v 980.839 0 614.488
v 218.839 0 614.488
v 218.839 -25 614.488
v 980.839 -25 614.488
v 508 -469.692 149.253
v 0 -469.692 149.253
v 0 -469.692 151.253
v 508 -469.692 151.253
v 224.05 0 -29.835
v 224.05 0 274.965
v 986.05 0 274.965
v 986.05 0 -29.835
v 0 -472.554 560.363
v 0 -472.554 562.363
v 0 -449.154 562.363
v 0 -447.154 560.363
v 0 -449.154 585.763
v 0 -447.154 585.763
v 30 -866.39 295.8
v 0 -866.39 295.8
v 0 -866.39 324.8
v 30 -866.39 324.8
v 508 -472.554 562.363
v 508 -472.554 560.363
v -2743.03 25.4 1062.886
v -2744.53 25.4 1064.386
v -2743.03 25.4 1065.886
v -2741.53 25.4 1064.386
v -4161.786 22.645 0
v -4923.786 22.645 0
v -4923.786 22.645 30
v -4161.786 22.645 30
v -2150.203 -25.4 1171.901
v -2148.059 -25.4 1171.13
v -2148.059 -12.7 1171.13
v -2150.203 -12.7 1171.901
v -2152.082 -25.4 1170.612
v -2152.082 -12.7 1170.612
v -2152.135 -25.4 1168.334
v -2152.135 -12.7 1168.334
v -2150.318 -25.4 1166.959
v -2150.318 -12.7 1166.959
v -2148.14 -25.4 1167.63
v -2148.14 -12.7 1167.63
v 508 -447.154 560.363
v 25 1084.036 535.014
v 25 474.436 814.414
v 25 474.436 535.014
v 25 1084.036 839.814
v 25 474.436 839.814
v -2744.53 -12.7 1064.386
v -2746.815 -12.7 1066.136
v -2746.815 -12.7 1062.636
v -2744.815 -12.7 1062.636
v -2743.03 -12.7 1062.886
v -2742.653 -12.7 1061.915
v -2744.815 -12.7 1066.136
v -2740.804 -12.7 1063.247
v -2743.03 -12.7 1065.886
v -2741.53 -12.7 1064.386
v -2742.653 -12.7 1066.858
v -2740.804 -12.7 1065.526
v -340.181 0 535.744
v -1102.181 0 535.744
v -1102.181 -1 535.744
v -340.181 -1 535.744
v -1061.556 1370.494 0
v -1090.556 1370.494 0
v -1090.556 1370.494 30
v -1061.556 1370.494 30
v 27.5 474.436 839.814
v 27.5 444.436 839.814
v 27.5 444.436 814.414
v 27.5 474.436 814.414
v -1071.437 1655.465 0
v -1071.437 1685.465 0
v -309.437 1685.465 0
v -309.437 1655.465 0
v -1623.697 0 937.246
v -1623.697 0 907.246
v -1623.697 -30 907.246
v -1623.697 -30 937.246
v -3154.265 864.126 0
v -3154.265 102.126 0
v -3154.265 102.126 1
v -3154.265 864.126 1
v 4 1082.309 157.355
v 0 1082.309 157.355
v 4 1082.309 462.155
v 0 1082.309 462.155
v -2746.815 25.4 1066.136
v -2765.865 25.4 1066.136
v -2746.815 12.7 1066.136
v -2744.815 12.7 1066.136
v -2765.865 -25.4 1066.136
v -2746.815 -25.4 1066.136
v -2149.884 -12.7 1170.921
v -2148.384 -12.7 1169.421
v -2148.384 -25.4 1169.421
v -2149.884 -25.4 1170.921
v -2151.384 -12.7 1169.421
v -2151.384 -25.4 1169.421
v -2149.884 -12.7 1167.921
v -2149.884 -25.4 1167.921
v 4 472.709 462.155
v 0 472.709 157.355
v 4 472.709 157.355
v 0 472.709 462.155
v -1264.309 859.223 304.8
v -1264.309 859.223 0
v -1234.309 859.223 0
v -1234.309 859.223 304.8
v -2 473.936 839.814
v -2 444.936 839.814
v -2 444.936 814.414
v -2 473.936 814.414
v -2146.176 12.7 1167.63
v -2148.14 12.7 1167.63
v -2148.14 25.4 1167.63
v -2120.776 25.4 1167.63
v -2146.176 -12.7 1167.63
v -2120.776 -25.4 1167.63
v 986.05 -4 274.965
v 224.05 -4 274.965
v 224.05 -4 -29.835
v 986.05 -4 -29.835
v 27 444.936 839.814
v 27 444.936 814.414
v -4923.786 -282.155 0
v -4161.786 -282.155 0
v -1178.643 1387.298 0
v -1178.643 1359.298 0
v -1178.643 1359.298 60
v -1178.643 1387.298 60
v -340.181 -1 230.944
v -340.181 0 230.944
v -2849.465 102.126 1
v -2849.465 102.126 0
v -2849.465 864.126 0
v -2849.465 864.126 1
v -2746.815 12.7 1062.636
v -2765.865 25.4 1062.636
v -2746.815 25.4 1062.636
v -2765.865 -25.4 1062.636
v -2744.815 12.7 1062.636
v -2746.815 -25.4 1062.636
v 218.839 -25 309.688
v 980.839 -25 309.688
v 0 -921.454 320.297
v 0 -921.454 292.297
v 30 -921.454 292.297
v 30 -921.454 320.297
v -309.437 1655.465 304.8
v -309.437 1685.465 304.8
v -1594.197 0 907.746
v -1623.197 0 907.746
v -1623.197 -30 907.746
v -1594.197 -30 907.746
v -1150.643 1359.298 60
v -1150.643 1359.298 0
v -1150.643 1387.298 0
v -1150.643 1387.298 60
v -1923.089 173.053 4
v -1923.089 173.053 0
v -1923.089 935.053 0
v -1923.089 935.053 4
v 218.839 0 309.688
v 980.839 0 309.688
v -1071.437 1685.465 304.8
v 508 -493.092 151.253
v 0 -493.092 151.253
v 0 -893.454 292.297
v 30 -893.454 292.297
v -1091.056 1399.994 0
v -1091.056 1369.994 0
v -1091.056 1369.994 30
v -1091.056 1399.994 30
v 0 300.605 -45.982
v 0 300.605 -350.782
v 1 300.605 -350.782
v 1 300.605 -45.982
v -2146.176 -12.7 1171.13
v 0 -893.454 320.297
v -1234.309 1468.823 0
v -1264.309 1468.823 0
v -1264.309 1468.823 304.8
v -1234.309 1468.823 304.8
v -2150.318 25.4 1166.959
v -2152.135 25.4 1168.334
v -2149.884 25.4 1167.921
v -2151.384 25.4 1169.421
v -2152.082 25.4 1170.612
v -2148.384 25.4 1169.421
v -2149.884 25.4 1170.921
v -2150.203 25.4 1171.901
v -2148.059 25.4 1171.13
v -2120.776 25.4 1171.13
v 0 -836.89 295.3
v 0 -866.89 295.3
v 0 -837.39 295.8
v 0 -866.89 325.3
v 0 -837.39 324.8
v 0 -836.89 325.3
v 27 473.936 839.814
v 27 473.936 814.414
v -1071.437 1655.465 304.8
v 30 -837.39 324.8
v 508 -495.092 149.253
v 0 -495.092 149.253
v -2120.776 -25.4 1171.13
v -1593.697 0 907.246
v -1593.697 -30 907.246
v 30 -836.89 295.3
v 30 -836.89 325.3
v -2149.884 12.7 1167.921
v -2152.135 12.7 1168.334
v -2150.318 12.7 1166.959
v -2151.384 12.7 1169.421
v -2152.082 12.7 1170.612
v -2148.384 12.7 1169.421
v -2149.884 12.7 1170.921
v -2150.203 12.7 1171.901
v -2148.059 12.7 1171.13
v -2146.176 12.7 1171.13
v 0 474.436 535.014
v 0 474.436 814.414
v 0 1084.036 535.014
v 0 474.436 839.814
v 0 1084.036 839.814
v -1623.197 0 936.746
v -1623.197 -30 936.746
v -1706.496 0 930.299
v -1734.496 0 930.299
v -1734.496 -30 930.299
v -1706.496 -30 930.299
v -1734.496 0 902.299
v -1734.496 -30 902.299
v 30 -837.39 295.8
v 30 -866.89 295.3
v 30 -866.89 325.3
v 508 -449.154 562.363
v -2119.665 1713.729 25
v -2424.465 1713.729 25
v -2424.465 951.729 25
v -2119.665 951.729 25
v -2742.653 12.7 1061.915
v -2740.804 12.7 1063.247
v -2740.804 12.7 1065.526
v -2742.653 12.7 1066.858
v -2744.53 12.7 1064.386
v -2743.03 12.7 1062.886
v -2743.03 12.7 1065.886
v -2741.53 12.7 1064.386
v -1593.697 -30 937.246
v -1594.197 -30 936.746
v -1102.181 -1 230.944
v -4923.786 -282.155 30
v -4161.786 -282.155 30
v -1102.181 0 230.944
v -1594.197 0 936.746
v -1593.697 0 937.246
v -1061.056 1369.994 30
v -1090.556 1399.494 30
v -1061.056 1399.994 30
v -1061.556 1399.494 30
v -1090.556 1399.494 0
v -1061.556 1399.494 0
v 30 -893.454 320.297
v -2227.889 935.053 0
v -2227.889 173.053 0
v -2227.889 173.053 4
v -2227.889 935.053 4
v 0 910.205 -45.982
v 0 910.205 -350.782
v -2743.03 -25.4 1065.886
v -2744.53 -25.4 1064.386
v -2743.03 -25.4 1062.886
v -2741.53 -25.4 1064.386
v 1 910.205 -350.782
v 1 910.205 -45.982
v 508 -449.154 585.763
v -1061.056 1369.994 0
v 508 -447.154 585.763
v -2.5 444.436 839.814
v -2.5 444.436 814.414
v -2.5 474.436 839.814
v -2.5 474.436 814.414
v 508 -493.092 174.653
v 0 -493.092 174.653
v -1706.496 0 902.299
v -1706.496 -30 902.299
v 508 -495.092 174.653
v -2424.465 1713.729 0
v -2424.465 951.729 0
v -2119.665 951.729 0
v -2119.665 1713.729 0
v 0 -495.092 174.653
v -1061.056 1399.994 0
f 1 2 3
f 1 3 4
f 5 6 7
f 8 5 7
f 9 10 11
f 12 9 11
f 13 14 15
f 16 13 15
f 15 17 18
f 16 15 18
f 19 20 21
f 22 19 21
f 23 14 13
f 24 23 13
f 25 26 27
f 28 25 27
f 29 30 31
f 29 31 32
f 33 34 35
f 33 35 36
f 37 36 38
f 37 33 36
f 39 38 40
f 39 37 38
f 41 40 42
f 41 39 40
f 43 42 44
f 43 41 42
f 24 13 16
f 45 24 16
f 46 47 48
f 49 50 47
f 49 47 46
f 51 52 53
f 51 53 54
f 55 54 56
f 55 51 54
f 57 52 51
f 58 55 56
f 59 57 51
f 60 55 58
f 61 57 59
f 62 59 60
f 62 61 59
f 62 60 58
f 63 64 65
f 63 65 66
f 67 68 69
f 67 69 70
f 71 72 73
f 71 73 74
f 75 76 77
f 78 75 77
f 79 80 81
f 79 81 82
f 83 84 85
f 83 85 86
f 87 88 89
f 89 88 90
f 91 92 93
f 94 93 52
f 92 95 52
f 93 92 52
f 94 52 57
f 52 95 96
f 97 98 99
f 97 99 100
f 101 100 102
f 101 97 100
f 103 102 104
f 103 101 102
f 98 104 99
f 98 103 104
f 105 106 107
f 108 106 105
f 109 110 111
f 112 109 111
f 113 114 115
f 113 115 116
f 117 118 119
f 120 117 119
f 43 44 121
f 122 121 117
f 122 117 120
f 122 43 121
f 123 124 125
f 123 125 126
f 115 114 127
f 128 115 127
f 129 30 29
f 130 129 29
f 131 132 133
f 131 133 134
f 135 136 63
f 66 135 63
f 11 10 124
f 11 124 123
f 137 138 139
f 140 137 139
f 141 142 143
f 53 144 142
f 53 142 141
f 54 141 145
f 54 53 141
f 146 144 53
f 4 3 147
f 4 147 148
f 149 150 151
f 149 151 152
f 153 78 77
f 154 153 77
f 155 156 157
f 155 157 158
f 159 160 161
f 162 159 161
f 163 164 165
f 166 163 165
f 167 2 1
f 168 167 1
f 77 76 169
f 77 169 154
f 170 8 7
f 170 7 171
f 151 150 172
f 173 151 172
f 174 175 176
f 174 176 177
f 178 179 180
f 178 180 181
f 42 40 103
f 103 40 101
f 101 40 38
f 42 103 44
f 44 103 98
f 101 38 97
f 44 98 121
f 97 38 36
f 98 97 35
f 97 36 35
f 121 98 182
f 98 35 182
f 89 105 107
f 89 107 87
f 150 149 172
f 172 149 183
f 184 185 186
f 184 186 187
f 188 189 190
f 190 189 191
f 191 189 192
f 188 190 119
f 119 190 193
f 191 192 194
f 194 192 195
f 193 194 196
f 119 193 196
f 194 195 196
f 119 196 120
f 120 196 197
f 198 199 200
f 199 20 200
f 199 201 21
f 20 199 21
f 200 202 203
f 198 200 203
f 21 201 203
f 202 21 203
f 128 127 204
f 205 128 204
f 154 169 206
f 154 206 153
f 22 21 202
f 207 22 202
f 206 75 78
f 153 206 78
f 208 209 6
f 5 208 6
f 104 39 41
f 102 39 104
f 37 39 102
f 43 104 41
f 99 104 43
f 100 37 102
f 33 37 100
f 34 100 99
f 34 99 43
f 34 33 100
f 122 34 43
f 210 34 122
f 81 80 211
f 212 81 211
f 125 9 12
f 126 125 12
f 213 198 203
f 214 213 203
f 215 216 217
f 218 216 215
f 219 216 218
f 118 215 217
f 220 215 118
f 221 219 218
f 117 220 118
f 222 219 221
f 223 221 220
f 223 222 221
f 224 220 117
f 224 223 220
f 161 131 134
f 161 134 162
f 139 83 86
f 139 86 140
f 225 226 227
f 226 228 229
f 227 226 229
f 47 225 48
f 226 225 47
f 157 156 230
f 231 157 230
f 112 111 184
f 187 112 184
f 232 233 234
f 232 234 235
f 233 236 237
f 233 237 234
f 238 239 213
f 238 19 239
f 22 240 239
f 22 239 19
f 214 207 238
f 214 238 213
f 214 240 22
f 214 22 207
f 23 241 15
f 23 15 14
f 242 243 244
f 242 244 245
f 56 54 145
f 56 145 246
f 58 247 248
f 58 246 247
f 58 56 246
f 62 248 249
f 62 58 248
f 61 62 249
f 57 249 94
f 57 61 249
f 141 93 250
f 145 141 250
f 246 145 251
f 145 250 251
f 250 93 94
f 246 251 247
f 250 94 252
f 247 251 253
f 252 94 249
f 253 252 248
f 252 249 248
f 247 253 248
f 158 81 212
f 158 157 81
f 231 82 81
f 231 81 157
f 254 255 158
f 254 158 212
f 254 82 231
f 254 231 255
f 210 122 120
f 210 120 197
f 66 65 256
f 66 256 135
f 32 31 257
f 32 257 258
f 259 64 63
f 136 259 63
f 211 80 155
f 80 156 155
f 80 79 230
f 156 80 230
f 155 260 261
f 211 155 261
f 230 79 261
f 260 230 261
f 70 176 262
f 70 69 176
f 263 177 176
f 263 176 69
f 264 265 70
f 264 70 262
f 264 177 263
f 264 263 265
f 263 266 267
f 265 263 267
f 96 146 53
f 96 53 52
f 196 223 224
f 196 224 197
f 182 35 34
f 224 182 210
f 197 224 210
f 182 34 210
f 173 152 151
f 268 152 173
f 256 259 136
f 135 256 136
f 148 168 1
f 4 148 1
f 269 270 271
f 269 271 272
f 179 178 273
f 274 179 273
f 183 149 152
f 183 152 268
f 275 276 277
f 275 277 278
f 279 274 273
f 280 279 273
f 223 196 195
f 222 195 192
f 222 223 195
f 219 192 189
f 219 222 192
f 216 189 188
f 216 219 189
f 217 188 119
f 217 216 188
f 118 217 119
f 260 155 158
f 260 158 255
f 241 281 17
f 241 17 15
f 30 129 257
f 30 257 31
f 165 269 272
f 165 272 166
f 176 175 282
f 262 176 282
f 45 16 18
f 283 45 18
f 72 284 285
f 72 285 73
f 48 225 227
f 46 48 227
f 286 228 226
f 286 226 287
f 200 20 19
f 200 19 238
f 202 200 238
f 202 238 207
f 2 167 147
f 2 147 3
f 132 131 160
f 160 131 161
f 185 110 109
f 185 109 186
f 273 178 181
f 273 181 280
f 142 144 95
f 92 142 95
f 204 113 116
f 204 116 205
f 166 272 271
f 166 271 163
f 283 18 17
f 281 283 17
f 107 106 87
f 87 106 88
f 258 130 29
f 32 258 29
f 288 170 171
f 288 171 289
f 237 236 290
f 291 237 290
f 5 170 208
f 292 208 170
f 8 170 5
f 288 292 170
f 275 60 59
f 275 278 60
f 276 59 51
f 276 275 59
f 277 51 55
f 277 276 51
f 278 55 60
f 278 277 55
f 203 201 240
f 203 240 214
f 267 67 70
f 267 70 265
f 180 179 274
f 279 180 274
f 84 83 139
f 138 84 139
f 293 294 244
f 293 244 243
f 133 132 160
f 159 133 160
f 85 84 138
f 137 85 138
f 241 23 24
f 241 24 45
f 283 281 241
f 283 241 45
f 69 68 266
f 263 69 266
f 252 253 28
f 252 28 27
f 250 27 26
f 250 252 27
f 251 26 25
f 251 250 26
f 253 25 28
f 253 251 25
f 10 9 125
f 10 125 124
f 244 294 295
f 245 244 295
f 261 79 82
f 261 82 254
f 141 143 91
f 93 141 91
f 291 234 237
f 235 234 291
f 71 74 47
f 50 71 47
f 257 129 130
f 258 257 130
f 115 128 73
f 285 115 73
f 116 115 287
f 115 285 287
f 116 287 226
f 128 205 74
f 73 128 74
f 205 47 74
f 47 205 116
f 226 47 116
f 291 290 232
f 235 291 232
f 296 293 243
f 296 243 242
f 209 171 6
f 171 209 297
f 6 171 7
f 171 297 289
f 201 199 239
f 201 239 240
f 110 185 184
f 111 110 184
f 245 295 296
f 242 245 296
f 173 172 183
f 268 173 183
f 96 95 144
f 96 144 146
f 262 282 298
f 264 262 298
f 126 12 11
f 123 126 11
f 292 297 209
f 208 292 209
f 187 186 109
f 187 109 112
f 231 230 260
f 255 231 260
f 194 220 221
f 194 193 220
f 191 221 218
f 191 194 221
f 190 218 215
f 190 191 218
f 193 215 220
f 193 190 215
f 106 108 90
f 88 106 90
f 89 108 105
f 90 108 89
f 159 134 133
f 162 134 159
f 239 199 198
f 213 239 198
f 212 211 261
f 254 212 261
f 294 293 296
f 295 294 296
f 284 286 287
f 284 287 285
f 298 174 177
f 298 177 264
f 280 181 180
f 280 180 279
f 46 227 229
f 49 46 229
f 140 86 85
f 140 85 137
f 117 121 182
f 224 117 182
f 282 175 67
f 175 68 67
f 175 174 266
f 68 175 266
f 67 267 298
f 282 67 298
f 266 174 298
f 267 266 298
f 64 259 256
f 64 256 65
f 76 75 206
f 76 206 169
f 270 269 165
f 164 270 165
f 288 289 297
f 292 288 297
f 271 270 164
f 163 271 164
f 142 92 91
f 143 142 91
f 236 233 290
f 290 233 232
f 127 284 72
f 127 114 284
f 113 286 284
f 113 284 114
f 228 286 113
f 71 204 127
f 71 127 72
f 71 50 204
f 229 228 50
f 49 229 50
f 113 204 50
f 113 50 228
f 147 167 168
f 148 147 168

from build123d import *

# Parameters (mm, degrees)
F0_W      = 762
F0_H      = 304.8
F1_DEPTH  = 25
F2_W      = 762
F2_H      = 304.8
F3_DEPTH  = 4
F4_W      = 762
F4_H      = 304.8
F5_DEPTH  = 1
F6_W      = 609.6
F6_H      = 304.8
F7_DEPTH  = 25
F8_W      = 609.6
F8_H      = 304.8
F9_DEPTH  = 4
F10_W     = 609.6
F10_H     = 304.8
F11_DEPTH = 1
F13_DEPTH = 508
F15_DEPTH = 508
F16_W     = 304.8
F16_H     = 762
F17_DEPTH = 25
F18_W     = 304.8
F18_H     = 762
F19_DEPTH = 1
F20_W     = 304.8
F20_H     = 762
F21_DEPTH = 4
F22_R     = 2.5
F22_R_2   = 1.5
F23_DEPTH = 12.7
F24_DEPTH = 25.4
F26_DEPTH = 25.4
F27_W     = 19.05
F27_H     = 3.5
F28_DEPTH = 25.4
F29_R     = 2.5
F29_R_2   = 1.5
F30_DEPTH = 25.4
F31_DEPTH = 12.7
F32_W     = 2
F32_H     = 3.5
F33_DEPTH = 25.4
F34_DEPTH = 12.7
F35_W     = 25.4
F35_H     = 3.5
F36_DEPTH = 50.8
F37_W     = 29
F37_H     = 29
F38_DEPTH = 25.4
F39_W     = 28
F39_H     = 28
F40_DEPTH = 60
F41_W     = 30
F41_H     = 30
F41_W_2   = 29
F41_H_2   = 29
F42_DEPTH = 30
F43_W     = 30
F43_H     = 609.6
F44_DEPTH = 304.8
F45_W     = 762
F45_H     = 30
F46_DEPTH = 304.8
F47_W     = 28
F47_H     = 28
F48_DEPTH = 30
F49_W     = 30
F49_H     = 30
F49_W_2   = 29
F49_H_2   = 29
F50_DEPTH = 30
F51_W     = 28
F51_H     = 28
F52_DEPTH = 30
F53_W     = 30
F53_H     = 30
F53_W_2   = 29
F53_H_2   = 29
F54_DEPTH = 30
F55_W     = 762
F55_H     = 304.8
F56_DEPTH = 30


with BuildPart() as f1:
    # F0 (on Front) → F1 (new body)
    with BuildSketch(Plane.XZ):
        with Locations((599.8386698723, 462.0880805476)):
            Rectangle(F0_W, F0_H)
    extrude(amount=F1_DEPTH)


with BuildPart() as f3:
    # F2 (on Front) → F3 (new body)
    with BuildSketch(Plane.XZ):
        with Locations((605.0495383174, 122.5652631044)):
            Rectangle(F2_W, F2_H)
    extrude(amount=F3_DEPTH)


with BuildPart() as f5:
    # F4 (on Front) → F5 (new body)
    with BuildSketch(Plane.XZ):
        with Locations((-721.1805027962, 383.3438879953)):
            Rectangle(F4_W, F4_H)
    extrude(amount=F5_DEPTH)


with BuildPart() as f7:
    # F6 (on Right) → F7 (new body)
    with BuildSketch(Plane.YZ):
        with Locations((779.2355034828, 687.4139923522)):
            Rectangle(F6_W, F6_H)
    extrude(amount=F7_DEPTH)

    # F37 (on face) → F38 (join)
    with BuildSketch(Plane.XY.offset(839.8139923522)):
        Polygon((-2.5, 444.4355034828), (27.5, 444.4355034828), (27.5, 474.4355034828), (25, 474.4355034828), (0, 474.4355034828), (-2.5, 474.4355034828), align=None)
        with Locations((12.5, 459.4355034828)):
            Rectangle(F37_W, F37_H, mode=Mode.SUBTRACT)
    extrude(amount=-F38_DEPTH)


with BuildPart() as f9:
    # F8 (on Right) → F9 (new body)
    with BuildSketch(Plane.YZ):
        with Locations((777.5092337608, 309.7554932385)):
            Rectangle(F8_W, F8_H)
    extrude(amount=F9_DEPTH)


with BuildPart() as f11:
    # F10 (on Right) → F11 (new body)
    with BuildSketch(Plane.YZ):
        with Locations((605.4046195984, -198.3824845113)):
            Rectangle(F10_W, F10_H)
    extrude(amount=F11_DEPTH)


with BuildPart() as f13:
    # F12 (on Right) → F13 (new body)
    with BuildSketch(Plane.YZ):
        Polygon((-493.0915064335, 174.6528752655), (-495.0915064335, 174.6528752655), (-495.0915064335, 149.2528752655), (-469.6915064335, 149.2528752655), (-469.6915064335, 151.2528752655), (-493.0915064335, 151.2528752655), align=None)
    extrude(amount=F13_DEPTH)


with BuildPart() as f15:
    # F14 (on Right) → F15 (new body)
    with BuildSketch(Plane.YZ):
        Polygon((-447.1541363748, 560.3632873245), (-447.1541363748, 585.7632873245), (-449.1541363748, 585.7632873245), (-449.1541363748, 562.3632873245), (-472.5541363748, 562.3632873245), (-472.5541363748, 560.3632873245), align=None)
    extrude(amount=F15_DEPTH)


with BuildPart() as f17:
    # F16 (on Top) → F17 (new body)
    with BuildSketch(Plane.XY):
        with Locations((-2272.0654850662, 1332.7294546127)):
            Rectangle(F16_W, F16_H)
    extrude(amount=F17_DEPTH)


with BuildPart() as f19:
    # F18 (on Top) → F19 (new body)
    with BuildSketch(Plane.XY):
        with Locations((-3001.8648662765, 483.1261294842)):
            Rectangle(F18_W, F18_H)
    extrude(amount=F19_DEPTH)


with BuildPart() as f21:
    # F20 (on Top) → F21 (new body)
    with BuildSketch(Plane.XY):
        with Locations((-2075.48878479, 554.0529595732)):
            Rectangle(F20_W, F20_H)
    extrude(amount=F21_DEPTH)


with BuildPart() as f23:
    # F22 (on Front) → F23 (new body, symmetric)
    with BuildSketch(Plane.XZ):
        with Locations((-2743.0295944214, 1064.3863677979)):
            Circle(F22_R)
        with Locations((-2743.0295944214, 1064.3863677979)):
            Circle(F22_R_2, mode=Mode.SUBTRACT)
    extrude(amount=F23_DEPTH, both=True)

    # F22 (on Front) → F24 (join, symmetric)
    with BuildSketch(Plane.XZ):
        with Locations((-2743.0295944214, 1064.3863677979)):
            Circle(F22_R_2)
    extrude(amount=F24_DEPTH, both=True)

    # F25 (on face) → F26 (join)
    with BuildSketch(Plane(origin=(0, 12.7, 0), x_dir=(-1, 0, 0), z_dir=(0, 1, 0))):
        with BuildLine():
            Line((2746.8149515285, 1066.1363677979), (2744.8149515285, 1066.1363677979))
            ThreePointArc((2744.8149515285, 1066.1363677979), (2745.3440482196, 1065.3315152023), (2745.5295944214, 1064.3863677979))
            ThreePointArc((2745.5295944214, 1064.3863677979), (2745.3440482196, 1063.4412203934), (2744.8149515285, 1062.6363677979))
            Line((2744.8149515285, 1062.6363677979), (2746.8149515285, 1062.6363677979))
            Line((2746.8149515285, 1062.6363677979), (2746.8149515285, 1066.1363677979))
        make_face()
    extrude(amount=-F26_DEPTH)

    # F27 (on face) → F28 (join, symmetric)
    with BuildSketch(Plane.XZ):
        with Locations((-2756.3399515285, 1064.3863677979)):
            Rectangle(F27_W, F27_H)
    extrude(amount=F28_DEPTH, both=True)


with BuildPart() as f30:
    # F29 (on Front) → F30 (new body, symmetric)
    with BuildSketch(Plane.XZ):
        with Locations((-2149.8839855194, 1169.4210767746)):
            Circle(F29_R)
        with Locations((-2149.8839855194, 1169.4210767746)):
            Circle(F29_R_2, mode=Mode.SUBTRACT)
    extrude(amount=F30_DEPTH, both=True)

    # F29 (on Front) → F31 (cut, symmetric)
    with BuildSketch(Plane.XZ):
        with Locations((-2149.8839855194, 1169.4210767746)):
            Circle(F29_R)
        with Locations((-2149.8839855194, 1169.4210767746)):
            Circle(F29_R_2, mode=Mode.SUBTRACT)
    extrude(amount=F31_DEPTH, both=True, mode=Mode.SUBTRACT)

    # F32 (on face) → F33 (join, symmetric)
    with BuildSketch(Plane.XZ):
        with Locations((-2147.1759129318, 1169.3797089655)):
            Rectangle(F32_W, F32_H)
    extrude(amount=F33_DEPTH, both=True)

    # F32 (on face) → F34 (cut, symmetric)
    with BuildSketch(Plane.XZ):
        with Locations((-2147.1759129318, 1169.3797089655)):
            Rectangle(F32_W, F32_H)
    extrude(amount=F34_DEPTH, both=True, mode=Mode.SUBTRACT)

    # F35 (on face) → F36 (join)
    with BuildSketch(Plane.XZ.offset(25.4)):
        with Locations((-2133.4759129318, 1169.3797089655)):
            Rectangle(F35_W, F35_H)
    extrude(amount=-F36_DEPTH)


with BuildPart() as f40:
    # F39 (on Top) → F40 (new body)
    with BuildSketch(Plane.XY):
        with Locations((-1164.6428689957, 1373.2977523804)):
            Rectangle(F39_W, F39_H)
    extrude(amount=F40_DEPTH)


with BuildPart() as f42:
    # F41 (on Top) → F42 (new body)
    with BuildSketch(Plane.XY):
        with Locations((-1076.0562123923, 1384.9940519333)):
            Rectangle(F41_W, F41_H)
        with Locations((-1076.0562123923, 1384.9940519333)):
            Rectangle(F41_W_2, F41_H_2, mode=Mode.SUBTRACT)
    extrude(amount=F42_DEPTH)


with BuildPart() as f44:
    # F43 (on Top) → F44 (new body)
    with BuildSketch(Plane.XY):
        with Locations((-1249.3088068203, 1164.0228033066)):
            Rectangle(F43_W, F43_H)
    extrude(amount=F44_DEPTH)


with BuildPart() as f46:
    # F45 (on Top) → F46 (new body)
    with BuildSketch(Plane.XY):
        with Locations((-690.4368151316, 1670.4653501511)):
            Rectangle(F45_W, F45_H)
    extrude(amount=F46_DEPTH)


with BuildPart() as f48:
    # F47 (on Front) → F48 (new body)
    with BuildSketch(Plane.XZ):
        with Locations((-1720.4962798794, 916.2989854813)):
            Rectangle(F47_W, F47_H)
    extrude(amount=F48_DEPTH)


with BuildPart() as f50:
    # F49 (on Front) → F50 (new body)
    with BuildSketch(Plane.XZ):
        with Locations((-1608.6968025134, 922.2461204529)):
            Rectangle(F49_W, F49_H)
        with Locations((-1608.6968025134, 922.2461204529)):
            Rectangle(F49_W_2, F49_H_2, mode=Mode.SUBTRACT)
    extrude(amount=F50_DEPTH)


with BuildPart() as f52:
    # F51 (on Right) → F52 (new body)
    with BuildSketch(Plane.YZ):
        with Locations((-907.4537928112, 306.2972426414)):
            Rectangle(F51_W, F51_H)
    extrude(amount=F52_DEPTH)


with BuildPart() as f54:
    # F53 (on Right) → F54 (new body)
    with BuildSketch(Plane.YZ):
        with Locations((-851.890368133, 310.2996866703)):
            Rectangle(F53_W, F53_H)
        with Locations((-851.890368133, 310.2996866703)):
            Rectangle(F53_W_2, F53_H_2, mode=Mode.SUBTRACT)
    extrude(amount=F54_DEPTH)


with BuildPart() as f56:
    # F55 (on Top) → F56 (new body)
    with BuildSketch(Plane.XY):
        with Locations((-4542.7856445312, -129.7550738062)):
            Rectangle(F55_W, F55_H)
    extrude(amount=F56_DEPTH)


solid = Compound([f1.part, f3.part, f5.part, f7.part, f9.part, f11.part, f13.part, f15.part, f17.part, f19.part, f21.part, f23.part, f30.part, f40.part, f42.part, f44.part, f46.part, f48.part, f50.part, f52.part, f54.part, f56.part])
